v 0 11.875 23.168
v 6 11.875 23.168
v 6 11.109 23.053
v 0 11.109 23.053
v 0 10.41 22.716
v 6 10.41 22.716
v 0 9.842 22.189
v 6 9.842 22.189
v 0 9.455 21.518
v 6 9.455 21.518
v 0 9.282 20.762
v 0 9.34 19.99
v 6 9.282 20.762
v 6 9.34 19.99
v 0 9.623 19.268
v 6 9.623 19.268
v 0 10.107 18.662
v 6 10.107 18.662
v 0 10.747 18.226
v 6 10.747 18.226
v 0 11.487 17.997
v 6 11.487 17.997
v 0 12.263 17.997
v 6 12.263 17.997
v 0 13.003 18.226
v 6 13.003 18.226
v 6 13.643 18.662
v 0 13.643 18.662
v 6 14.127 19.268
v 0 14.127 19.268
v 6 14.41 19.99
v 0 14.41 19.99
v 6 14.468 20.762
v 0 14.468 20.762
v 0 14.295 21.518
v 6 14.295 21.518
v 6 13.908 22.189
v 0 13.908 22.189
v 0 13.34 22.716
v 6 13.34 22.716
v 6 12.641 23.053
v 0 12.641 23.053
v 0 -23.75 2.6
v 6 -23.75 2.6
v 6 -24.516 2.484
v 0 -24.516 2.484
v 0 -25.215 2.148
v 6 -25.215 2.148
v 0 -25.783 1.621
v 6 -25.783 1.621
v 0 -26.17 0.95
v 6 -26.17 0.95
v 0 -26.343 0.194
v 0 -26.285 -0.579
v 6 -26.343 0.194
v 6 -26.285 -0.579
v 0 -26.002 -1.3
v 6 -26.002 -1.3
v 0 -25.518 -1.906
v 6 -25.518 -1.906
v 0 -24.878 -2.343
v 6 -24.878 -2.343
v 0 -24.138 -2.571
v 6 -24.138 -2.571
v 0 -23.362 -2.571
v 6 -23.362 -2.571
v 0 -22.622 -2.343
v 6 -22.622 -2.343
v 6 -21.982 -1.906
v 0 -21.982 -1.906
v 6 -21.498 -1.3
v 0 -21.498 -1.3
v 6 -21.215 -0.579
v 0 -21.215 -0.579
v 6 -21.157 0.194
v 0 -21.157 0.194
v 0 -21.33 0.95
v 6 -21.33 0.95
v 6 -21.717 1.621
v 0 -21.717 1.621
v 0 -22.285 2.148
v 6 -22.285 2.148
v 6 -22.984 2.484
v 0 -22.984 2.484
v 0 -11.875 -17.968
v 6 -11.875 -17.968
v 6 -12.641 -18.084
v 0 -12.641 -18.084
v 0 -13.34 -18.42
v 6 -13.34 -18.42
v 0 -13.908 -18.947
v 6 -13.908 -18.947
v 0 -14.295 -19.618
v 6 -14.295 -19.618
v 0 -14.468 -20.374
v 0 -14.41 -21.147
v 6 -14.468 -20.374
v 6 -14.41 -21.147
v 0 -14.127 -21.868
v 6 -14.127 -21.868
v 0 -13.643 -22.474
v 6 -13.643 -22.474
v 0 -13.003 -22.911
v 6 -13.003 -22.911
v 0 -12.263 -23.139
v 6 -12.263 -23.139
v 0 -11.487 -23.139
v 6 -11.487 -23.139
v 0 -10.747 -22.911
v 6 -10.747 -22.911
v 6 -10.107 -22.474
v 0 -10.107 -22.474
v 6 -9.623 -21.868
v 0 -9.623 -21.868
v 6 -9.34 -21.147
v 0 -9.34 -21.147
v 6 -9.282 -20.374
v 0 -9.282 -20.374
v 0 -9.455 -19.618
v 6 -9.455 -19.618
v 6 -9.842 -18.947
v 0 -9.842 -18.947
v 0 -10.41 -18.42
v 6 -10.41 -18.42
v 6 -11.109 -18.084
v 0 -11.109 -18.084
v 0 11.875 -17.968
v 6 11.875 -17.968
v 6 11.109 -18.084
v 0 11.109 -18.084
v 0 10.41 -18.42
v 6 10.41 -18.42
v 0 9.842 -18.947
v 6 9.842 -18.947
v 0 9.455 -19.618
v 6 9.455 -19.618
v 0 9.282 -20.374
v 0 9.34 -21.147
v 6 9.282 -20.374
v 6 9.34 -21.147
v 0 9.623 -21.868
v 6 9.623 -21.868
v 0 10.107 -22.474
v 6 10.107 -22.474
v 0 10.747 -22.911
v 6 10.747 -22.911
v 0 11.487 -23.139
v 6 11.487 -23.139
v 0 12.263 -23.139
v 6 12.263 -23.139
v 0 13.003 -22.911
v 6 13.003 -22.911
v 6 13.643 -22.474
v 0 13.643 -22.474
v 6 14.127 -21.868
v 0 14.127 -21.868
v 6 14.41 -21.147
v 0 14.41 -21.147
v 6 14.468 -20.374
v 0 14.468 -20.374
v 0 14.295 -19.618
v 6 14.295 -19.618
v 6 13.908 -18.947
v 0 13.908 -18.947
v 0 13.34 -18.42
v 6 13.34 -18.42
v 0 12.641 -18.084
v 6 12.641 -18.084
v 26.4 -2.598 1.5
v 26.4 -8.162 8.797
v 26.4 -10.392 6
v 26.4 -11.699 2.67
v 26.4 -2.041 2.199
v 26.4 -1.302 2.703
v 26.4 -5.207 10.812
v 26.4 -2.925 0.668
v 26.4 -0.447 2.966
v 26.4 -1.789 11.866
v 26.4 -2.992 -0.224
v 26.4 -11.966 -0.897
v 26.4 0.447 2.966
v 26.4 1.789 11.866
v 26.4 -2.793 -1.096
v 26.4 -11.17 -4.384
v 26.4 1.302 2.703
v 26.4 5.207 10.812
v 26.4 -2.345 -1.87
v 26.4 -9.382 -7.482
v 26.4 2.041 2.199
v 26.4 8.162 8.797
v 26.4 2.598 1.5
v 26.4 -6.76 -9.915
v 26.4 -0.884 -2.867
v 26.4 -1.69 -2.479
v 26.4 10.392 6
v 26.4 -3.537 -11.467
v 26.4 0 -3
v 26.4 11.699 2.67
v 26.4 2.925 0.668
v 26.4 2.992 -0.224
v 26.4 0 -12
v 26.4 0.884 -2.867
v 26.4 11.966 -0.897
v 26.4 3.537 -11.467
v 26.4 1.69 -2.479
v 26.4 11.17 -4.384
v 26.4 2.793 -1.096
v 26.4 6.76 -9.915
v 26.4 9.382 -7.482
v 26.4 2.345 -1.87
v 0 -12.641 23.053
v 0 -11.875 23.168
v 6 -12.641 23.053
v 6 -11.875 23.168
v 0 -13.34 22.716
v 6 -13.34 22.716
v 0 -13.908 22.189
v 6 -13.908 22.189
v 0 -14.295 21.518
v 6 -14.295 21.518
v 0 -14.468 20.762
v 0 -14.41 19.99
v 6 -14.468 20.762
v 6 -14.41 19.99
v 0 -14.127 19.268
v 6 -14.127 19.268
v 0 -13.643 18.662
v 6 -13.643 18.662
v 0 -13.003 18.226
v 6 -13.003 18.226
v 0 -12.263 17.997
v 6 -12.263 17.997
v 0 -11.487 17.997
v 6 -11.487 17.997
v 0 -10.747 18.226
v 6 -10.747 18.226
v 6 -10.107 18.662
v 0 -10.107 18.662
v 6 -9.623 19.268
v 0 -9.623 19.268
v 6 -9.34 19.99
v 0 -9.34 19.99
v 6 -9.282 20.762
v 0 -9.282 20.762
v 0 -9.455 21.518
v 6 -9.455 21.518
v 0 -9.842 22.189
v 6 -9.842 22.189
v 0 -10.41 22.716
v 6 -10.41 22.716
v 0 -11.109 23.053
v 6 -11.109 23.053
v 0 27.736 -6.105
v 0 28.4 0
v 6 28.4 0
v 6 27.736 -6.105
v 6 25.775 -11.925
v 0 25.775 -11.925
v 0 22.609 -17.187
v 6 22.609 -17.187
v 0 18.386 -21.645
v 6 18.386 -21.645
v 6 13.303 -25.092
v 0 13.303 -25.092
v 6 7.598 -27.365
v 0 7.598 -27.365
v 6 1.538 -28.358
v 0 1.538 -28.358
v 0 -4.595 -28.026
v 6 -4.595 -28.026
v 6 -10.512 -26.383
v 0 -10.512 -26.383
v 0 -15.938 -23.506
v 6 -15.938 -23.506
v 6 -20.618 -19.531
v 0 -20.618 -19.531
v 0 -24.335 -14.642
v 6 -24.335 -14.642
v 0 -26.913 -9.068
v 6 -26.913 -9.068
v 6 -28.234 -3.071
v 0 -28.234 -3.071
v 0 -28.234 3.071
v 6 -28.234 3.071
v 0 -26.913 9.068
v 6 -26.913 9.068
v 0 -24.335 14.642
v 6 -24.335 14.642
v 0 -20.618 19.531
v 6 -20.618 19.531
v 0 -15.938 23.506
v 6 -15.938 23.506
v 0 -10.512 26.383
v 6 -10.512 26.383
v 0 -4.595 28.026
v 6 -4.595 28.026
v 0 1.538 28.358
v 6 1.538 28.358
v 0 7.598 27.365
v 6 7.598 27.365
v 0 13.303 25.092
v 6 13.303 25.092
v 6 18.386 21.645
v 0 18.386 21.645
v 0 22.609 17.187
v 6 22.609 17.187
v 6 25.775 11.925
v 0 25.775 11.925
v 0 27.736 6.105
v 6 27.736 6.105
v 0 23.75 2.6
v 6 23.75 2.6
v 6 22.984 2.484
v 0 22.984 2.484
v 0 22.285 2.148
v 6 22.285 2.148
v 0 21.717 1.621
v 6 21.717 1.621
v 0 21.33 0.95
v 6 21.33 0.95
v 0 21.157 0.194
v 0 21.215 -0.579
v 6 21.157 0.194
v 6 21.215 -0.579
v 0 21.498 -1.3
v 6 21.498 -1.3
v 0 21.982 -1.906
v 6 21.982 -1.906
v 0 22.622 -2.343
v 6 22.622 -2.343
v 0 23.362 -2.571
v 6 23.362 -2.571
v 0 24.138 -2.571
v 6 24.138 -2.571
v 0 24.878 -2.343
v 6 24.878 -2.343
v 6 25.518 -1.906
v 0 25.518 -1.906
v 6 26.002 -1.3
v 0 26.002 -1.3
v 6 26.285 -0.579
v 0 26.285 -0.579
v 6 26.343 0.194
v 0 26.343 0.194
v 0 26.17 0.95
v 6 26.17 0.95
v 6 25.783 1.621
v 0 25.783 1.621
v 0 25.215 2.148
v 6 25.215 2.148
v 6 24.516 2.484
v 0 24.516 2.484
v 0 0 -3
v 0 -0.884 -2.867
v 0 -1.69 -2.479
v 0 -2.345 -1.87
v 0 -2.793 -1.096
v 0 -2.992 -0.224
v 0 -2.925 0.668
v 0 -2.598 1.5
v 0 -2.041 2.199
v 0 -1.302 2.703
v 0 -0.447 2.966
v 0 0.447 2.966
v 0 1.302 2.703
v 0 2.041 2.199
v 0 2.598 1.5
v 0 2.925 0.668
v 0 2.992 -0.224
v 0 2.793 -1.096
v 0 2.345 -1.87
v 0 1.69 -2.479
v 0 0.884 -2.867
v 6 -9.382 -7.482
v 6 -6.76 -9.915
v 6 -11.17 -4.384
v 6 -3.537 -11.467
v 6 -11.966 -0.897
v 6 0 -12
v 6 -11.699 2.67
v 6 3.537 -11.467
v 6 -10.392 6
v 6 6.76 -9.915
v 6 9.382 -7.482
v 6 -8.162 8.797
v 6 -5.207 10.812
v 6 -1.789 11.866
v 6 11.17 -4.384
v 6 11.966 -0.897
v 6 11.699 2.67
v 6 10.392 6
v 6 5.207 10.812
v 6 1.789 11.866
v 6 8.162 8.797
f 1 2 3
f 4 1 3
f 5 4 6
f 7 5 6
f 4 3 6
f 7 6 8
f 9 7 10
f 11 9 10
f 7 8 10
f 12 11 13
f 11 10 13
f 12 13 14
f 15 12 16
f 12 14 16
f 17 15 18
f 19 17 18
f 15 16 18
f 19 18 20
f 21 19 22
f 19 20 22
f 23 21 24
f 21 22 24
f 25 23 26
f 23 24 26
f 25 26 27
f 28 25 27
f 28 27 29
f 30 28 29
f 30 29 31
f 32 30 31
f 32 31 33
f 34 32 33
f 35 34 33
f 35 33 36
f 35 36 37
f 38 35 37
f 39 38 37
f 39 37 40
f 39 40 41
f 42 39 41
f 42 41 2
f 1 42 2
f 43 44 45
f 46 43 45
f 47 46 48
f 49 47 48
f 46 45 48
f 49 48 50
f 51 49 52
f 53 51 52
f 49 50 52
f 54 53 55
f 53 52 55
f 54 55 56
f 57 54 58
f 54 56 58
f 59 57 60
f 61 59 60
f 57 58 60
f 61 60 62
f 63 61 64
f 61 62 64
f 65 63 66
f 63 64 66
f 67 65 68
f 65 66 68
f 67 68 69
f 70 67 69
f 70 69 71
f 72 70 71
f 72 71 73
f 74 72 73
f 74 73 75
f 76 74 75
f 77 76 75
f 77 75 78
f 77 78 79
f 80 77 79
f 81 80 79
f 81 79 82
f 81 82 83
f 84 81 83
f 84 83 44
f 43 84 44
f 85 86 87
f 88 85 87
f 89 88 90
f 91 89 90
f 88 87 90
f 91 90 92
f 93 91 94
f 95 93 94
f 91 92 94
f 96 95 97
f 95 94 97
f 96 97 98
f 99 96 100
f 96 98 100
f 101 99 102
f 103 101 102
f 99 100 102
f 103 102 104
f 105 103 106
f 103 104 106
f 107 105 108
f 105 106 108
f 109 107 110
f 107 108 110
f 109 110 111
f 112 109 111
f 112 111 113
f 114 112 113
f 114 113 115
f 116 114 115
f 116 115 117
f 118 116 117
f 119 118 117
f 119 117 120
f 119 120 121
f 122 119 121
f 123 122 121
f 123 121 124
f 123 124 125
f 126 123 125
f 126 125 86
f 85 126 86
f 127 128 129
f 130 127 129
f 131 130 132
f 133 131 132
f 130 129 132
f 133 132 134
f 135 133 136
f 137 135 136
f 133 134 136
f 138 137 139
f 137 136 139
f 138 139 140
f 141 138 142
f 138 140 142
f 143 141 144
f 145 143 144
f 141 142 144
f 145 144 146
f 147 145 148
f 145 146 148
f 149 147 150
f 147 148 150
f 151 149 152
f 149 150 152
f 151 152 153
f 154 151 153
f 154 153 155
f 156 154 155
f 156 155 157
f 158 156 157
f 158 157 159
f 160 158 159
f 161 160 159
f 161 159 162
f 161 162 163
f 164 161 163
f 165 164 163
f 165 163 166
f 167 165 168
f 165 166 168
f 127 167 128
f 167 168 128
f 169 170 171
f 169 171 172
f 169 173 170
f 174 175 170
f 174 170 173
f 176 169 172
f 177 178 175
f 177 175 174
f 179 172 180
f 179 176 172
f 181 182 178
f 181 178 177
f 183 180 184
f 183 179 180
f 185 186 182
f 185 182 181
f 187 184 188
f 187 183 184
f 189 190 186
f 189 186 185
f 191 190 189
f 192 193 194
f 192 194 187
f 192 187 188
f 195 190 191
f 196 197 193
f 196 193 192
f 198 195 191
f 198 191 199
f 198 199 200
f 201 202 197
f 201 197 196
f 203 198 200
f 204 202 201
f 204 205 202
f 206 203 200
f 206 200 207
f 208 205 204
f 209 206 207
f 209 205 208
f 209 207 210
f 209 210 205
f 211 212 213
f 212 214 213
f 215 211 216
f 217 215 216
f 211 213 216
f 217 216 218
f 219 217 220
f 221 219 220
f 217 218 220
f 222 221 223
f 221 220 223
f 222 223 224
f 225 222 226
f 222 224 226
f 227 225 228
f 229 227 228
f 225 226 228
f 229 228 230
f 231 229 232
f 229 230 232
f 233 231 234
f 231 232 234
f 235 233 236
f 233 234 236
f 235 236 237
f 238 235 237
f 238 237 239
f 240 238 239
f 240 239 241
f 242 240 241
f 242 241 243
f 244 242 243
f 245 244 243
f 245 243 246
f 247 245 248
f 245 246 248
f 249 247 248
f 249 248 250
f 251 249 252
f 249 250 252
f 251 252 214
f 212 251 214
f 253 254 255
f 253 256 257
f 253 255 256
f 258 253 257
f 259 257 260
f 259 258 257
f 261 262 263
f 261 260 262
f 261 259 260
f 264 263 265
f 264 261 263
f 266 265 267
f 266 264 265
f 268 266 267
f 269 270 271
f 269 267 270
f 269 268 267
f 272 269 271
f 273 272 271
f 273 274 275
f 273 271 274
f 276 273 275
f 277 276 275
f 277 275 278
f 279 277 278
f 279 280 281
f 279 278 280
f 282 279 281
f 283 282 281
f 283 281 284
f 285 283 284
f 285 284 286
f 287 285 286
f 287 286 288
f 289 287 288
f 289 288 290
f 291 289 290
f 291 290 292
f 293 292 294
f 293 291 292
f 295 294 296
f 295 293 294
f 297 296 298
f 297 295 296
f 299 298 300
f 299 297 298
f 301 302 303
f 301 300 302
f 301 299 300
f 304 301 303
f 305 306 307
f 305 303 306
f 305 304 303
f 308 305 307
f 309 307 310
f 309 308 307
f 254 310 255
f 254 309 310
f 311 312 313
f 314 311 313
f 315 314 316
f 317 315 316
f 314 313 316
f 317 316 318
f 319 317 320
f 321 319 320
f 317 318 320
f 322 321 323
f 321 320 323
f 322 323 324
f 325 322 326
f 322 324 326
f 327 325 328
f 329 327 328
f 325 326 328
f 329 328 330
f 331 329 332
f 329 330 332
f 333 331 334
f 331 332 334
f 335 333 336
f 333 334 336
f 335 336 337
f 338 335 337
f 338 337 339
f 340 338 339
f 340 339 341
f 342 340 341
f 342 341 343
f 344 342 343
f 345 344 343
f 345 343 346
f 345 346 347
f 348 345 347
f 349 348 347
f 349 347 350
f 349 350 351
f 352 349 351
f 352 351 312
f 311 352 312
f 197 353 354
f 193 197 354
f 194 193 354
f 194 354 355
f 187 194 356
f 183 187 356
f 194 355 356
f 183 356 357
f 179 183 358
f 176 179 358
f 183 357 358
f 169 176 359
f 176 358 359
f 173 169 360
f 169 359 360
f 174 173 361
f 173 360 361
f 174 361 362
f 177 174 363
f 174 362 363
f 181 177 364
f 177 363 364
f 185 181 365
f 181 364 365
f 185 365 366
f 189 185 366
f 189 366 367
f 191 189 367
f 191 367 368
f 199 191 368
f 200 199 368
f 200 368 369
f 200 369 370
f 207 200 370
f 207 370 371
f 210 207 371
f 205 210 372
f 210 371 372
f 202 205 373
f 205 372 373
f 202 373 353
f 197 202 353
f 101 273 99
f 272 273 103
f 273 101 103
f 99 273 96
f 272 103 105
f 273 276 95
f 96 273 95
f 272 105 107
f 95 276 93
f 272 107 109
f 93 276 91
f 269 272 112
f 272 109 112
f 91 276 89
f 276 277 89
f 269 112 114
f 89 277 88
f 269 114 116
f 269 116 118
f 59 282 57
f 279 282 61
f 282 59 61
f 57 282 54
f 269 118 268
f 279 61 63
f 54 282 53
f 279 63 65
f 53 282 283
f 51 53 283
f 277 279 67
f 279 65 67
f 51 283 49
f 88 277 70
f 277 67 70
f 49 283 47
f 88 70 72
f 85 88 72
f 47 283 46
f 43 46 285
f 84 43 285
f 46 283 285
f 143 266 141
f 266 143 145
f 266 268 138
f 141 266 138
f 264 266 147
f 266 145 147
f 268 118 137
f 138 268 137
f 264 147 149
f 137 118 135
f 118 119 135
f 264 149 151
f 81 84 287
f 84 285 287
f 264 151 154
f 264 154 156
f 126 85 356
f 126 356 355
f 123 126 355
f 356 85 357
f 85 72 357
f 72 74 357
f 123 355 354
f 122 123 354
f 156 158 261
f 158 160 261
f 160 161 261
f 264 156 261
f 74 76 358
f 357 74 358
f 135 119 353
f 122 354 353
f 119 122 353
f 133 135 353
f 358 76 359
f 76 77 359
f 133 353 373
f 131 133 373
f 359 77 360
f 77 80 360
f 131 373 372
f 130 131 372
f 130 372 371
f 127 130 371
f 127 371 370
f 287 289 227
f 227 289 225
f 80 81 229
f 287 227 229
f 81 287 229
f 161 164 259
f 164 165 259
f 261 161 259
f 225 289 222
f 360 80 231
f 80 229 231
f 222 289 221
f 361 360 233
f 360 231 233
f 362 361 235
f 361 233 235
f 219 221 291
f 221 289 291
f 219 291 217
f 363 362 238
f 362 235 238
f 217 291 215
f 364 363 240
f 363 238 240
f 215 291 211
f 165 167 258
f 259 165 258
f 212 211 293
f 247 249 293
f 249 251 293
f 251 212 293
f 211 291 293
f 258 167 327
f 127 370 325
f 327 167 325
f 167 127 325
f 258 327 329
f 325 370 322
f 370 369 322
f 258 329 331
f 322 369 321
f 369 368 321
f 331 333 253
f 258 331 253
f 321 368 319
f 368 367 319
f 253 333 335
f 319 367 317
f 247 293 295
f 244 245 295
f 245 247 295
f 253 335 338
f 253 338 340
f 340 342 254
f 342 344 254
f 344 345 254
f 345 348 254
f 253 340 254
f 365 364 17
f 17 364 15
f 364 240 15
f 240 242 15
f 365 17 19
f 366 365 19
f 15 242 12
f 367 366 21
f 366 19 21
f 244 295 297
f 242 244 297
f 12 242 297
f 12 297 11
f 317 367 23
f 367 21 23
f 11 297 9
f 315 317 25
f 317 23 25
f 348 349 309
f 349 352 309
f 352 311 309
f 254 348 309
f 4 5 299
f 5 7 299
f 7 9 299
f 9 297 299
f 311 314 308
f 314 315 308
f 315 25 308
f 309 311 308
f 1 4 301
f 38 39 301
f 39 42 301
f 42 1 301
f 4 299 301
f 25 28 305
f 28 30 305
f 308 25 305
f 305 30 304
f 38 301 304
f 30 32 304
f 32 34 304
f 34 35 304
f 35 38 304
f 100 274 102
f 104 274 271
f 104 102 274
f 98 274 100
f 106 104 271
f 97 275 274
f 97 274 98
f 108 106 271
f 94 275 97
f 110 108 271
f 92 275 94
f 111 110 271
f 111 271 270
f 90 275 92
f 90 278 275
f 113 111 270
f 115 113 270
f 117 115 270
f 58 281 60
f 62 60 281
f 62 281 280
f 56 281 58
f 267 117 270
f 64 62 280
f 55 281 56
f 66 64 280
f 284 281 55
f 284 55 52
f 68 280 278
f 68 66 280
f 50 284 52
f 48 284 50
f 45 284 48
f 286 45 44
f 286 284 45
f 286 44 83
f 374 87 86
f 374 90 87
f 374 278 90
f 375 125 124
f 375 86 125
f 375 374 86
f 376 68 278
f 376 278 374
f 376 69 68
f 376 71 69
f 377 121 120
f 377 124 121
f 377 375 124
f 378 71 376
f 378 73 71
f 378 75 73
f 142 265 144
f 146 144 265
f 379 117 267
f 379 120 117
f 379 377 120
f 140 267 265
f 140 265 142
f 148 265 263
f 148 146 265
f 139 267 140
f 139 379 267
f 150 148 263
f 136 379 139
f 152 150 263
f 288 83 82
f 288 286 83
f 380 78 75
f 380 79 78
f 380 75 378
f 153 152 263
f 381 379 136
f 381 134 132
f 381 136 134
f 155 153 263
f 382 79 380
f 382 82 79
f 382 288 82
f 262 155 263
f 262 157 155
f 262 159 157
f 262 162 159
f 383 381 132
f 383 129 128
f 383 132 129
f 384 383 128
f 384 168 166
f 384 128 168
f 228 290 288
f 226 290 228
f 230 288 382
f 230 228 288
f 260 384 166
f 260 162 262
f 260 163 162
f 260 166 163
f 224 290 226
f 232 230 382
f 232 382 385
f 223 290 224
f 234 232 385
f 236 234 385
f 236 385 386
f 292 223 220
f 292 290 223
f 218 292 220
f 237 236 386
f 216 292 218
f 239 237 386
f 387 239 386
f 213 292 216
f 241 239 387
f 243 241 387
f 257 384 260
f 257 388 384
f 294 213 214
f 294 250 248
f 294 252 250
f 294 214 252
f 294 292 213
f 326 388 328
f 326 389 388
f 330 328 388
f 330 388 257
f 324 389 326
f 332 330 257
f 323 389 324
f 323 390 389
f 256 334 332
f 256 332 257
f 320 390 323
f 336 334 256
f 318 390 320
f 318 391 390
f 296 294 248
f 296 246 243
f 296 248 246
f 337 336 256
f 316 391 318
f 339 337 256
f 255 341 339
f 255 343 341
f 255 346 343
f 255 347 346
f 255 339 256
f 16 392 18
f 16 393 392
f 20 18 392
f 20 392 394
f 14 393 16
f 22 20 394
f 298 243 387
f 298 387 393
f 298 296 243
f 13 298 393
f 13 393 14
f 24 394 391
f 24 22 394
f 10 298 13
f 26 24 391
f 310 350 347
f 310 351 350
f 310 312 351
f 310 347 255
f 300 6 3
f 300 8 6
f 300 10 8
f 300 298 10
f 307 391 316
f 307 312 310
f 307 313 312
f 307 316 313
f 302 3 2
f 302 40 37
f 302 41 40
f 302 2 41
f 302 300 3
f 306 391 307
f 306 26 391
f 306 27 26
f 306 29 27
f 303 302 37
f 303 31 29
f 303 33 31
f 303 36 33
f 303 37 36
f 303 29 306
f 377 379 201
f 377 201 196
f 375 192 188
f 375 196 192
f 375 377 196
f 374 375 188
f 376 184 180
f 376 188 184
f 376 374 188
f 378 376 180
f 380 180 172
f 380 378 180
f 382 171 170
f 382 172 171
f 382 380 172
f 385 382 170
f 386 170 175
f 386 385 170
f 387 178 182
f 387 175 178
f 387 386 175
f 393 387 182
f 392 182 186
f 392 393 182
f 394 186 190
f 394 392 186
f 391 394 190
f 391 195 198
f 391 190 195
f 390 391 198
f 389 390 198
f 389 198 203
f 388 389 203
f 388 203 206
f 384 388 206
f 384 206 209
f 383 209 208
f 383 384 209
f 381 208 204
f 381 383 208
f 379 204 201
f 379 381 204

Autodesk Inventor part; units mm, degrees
ref_plane "YZ Plane" through (0, 0, 0) normal (1, 0, 0) x (0, 1, 0)
ref_plane "XZ Plane" through (0, 0, 0) normal (0, 1, 0) x (-1, 0, 0)
ref_plane "XY Plane" through (0, 0, 0) normal (0, 0, 1) x (1, 0, 0)
sketch "スケッチ1" plane through (0, 0, 0) normal (1, 0, 0) x (0, 1, 0)
  point P0 (0, 0)
sketch "スケッチ2" plane through (0, 0, 0) normal (1, 0, 0) x (0, 1, 0)
  circle A0 centre (0, 0) radius 28.4
  dimension "d0" = 56.8
extrude "押し出し1" add sketch "スケッチ2" along normal blind 6
sketch "スケッチ3" plane through (6, 0, 0) normal (1, 0, 0) x (0, 0, -1)
  circle A0 centre (0, 0) radius 12
  dimension "d3" = 24
extrude "押し出し2" add sketch "スケッチ3" along normal blind 20.4
sketch "スケッチ8" plane through (26.4, 0, 0) normal (1, 0, 0) x (0, 0, -1)
  circle A0 centre (0, 0) radius 12 projected
hole "穴2" at (26.4, 0, 0) direction (-1, 0, 0) diameter 6 end through all
sketch "スケッチ7" plane through (0, 0, 0) normal (-1, 0, 0) x (0, 0, 1)
  circle A0 centre (0, 0) radius 23.75
  line L0 (0, -23.75) -> (-20.5681, -11.875)
  line L1 (-20.5681, -11.875) -> (-20.5681, 11.875)
  line L2 (-20.5681, 11.875) -> (0, 23.75)
  line L3 (0, 23.75) -> (20.5681, 11.875)
  line L4 (20.5681, 11.875) -> (20.5681, -11.875)
  line L5 (20.5681, -11.875) -> (0, -23.75)
  dimension "d43" = 47.5
hole "穴3" at (0, 11.875, 20.5681) at (0, 23.75, 0) at (0, -11.875, 20.5681) at (0, -23.75, 0) at (0, -11.875, -20.5681) at (0, 11.875, -20.5681) direction (1, 0, 0) diameter 5.2 end through all
properties part number "10mmkethub18025"
